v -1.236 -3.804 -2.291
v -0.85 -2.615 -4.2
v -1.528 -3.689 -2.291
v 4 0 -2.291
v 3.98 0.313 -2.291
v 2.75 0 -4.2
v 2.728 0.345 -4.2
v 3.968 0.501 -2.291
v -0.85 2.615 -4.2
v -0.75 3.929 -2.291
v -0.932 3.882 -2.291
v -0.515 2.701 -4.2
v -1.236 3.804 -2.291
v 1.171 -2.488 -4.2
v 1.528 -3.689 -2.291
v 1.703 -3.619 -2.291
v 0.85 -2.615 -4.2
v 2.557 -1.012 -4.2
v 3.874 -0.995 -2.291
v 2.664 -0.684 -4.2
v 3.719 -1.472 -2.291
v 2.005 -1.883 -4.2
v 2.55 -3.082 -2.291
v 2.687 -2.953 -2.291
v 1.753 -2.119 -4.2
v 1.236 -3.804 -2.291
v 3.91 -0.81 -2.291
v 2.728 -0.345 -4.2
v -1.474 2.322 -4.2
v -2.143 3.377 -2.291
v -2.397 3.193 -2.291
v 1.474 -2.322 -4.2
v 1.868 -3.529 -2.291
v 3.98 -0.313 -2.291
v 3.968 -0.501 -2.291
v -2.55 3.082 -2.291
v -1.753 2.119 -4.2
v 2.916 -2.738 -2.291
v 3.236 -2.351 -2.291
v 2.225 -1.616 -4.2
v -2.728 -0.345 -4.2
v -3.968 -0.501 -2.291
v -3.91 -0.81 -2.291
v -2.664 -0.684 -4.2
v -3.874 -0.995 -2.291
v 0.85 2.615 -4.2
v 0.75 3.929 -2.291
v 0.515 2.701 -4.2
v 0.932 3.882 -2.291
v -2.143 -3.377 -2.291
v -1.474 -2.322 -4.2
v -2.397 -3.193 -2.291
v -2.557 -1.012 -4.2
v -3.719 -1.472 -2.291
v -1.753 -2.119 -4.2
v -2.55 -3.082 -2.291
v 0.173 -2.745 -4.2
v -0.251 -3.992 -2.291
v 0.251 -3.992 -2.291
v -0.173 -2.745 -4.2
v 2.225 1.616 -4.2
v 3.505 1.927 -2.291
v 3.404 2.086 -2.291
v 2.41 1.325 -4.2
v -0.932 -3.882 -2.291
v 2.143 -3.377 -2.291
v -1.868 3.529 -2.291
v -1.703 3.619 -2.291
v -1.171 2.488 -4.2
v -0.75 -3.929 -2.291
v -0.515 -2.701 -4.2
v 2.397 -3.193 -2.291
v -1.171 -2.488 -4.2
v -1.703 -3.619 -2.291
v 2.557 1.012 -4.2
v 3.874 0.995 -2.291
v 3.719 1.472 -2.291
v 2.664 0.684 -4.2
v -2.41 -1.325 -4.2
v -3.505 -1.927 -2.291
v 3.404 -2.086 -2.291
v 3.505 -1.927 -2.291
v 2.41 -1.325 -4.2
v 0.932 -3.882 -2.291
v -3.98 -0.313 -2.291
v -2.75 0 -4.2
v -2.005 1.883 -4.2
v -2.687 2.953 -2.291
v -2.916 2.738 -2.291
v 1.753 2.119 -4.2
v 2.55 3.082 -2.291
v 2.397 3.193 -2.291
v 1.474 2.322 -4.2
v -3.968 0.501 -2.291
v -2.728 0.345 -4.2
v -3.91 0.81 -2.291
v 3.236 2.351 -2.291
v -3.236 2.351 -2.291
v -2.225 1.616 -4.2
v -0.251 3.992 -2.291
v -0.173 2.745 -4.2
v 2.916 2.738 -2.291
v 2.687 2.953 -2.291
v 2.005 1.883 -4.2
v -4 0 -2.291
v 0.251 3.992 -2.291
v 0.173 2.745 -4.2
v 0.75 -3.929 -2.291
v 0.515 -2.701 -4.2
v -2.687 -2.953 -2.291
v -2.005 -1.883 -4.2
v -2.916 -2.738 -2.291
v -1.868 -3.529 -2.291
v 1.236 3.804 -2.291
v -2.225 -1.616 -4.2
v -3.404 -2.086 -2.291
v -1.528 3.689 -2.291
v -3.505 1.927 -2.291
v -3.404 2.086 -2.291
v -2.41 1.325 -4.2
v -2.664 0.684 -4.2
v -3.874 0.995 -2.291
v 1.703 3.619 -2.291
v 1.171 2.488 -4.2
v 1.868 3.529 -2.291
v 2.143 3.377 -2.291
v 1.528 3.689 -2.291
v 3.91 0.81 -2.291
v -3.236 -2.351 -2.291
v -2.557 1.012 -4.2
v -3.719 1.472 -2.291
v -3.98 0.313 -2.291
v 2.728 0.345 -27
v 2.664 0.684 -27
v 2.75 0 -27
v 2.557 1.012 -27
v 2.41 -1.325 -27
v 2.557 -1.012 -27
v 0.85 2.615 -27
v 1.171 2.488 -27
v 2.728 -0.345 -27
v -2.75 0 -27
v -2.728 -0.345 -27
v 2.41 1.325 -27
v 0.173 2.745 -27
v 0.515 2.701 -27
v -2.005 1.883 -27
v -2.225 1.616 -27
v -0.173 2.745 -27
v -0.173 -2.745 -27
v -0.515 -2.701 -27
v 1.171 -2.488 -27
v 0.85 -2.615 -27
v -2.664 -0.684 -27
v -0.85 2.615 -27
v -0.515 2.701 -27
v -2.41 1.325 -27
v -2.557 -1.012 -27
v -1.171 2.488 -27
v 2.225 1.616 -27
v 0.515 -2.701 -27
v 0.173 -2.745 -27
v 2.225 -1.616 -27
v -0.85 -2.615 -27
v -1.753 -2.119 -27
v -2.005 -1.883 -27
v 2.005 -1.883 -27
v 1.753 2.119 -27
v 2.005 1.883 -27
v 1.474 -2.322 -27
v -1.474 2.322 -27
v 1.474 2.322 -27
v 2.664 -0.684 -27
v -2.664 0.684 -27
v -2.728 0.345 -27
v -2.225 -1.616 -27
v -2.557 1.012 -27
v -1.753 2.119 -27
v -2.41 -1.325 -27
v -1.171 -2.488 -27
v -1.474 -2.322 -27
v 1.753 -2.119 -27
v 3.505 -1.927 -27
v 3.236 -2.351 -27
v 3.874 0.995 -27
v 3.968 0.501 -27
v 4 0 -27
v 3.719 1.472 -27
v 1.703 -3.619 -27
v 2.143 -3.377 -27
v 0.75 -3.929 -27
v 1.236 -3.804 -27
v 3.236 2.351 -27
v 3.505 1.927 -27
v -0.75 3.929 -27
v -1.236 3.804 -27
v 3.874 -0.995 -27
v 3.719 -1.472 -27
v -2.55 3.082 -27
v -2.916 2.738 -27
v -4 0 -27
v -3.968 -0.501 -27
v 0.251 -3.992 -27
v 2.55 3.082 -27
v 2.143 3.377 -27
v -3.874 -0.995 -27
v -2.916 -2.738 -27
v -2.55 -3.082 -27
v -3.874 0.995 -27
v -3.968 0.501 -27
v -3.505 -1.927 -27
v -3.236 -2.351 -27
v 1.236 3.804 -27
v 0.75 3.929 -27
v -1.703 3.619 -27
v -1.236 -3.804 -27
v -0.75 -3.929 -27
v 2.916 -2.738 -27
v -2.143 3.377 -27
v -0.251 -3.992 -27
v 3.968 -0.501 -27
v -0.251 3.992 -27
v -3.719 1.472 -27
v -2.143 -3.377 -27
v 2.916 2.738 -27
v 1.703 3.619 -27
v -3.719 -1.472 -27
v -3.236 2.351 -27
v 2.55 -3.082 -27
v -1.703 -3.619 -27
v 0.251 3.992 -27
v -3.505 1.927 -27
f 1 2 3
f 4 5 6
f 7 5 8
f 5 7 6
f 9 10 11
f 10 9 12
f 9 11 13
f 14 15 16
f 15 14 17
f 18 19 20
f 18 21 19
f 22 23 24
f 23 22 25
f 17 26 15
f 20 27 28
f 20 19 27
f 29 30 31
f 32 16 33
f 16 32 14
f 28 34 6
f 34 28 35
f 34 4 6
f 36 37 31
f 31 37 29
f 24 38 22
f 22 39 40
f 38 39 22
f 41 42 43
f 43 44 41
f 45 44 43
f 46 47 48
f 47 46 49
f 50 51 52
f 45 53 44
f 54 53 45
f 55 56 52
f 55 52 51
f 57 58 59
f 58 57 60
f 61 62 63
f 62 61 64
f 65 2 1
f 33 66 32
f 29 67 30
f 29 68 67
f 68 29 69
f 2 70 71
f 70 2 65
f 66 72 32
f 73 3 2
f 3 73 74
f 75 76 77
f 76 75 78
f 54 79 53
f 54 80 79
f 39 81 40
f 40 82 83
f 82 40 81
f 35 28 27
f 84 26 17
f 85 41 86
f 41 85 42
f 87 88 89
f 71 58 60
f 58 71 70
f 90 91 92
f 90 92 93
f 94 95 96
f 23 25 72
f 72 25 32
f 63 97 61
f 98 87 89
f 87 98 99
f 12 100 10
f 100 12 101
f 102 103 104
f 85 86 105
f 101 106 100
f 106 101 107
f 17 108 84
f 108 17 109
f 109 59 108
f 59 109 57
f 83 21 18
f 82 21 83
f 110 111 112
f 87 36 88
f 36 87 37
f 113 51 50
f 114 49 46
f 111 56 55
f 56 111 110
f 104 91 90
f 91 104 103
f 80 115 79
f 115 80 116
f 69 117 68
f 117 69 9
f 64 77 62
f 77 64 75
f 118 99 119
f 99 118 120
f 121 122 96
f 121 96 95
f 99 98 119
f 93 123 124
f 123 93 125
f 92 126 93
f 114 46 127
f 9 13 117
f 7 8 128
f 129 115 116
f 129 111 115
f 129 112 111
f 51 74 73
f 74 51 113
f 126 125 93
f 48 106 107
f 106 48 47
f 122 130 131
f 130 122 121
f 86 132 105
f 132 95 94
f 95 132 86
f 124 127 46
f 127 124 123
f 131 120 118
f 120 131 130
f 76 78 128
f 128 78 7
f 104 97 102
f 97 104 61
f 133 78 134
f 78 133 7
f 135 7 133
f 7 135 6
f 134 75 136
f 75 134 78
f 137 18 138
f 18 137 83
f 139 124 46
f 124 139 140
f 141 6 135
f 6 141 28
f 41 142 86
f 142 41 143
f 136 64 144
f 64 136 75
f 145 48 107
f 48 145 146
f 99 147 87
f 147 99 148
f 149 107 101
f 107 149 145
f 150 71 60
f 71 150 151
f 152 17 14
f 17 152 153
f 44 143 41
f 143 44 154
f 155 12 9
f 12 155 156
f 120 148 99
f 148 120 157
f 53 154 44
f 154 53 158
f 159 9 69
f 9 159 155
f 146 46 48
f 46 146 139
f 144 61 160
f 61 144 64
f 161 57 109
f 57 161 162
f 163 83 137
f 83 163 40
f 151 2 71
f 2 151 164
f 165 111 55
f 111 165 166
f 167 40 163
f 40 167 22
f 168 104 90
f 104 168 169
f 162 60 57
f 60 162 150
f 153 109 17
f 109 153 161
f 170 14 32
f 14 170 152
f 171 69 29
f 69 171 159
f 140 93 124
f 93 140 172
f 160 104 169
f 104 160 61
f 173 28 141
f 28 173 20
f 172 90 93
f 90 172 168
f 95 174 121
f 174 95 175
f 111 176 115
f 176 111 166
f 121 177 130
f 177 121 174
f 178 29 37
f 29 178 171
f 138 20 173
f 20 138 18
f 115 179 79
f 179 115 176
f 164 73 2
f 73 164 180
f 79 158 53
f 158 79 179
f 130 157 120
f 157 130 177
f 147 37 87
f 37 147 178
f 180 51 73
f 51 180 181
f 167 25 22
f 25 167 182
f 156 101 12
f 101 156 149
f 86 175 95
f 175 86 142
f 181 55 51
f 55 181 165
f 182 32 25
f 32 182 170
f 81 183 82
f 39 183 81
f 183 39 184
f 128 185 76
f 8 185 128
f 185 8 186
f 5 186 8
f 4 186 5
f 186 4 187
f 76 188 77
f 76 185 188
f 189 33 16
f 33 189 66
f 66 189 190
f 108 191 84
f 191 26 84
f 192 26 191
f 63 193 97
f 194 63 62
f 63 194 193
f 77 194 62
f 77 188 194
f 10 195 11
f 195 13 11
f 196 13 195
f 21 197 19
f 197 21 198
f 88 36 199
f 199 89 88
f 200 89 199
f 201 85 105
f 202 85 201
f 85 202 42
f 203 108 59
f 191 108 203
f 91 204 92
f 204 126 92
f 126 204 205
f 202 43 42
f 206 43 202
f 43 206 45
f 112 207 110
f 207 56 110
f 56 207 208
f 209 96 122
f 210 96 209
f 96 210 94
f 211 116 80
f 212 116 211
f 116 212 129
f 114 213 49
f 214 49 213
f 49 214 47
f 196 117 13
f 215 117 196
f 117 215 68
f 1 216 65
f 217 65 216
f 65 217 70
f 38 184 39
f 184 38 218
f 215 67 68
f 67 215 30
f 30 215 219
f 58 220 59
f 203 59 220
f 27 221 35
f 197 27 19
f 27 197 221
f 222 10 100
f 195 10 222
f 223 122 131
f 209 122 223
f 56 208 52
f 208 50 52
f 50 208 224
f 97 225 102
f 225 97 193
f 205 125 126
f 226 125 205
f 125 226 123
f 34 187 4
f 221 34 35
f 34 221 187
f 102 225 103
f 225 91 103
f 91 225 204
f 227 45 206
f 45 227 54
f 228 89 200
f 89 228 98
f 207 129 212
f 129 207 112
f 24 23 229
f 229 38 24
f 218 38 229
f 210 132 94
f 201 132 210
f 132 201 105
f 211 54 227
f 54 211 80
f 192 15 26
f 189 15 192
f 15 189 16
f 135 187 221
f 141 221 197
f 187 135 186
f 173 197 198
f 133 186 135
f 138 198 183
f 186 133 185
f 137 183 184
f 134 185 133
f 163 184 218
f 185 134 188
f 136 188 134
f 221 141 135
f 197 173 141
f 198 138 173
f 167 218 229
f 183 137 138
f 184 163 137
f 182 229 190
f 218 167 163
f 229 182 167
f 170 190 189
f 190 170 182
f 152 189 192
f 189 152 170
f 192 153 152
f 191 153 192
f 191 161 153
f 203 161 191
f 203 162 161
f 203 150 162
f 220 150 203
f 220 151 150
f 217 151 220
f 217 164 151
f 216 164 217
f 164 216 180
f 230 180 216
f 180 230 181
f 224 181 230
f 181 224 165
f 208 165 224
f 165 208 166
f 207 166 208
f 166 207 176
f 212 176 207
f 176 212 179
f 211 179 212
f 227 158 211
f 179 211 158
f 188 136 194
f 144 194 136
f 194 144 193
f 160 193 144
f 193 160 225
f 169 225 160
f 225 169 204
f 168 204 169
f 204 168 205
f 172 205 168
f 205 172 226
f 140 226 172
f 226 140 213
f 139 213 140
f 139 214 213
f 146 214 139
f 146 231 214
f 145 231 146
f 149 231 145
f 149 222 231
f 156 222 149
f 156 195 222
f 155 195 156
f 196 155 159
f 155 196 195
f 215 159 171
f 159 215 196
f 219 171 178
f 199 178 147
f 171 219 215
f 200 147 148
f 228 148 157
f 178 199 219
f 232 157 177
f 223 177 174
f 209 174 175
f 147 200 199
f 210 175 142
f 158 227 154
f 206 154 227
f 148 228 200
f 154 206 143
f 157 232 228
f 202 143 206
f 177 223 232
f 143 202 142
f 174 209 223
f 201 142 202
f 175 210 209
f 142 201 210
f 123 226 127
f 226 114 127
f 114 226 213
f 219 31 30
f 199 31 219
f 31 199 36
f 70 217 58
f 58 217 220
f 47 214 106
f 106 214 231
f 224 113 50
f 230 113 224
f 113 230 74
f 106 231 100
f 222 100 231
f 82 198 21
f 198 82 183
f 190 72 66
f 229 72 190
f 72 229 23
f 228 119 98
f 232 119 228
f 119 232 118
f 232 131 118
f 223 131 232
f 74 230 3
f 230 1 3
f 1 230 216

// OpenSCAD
$fn = 50;

difference() {
	union() {
		translate(v = [0, 0, -27.0]) {
			cylinder(h = 30, r = 4.0);
		}
	}
	union() {
		translate(v = [0, 0, 0]) {
			rotate(a = [0, 0, 0]) {
				difference() {
					union() {
						translate(v = [0, 0, -30.0]) {
							cylinder(h = 30, r = 2.25);
						}
						translate(v = [0, 0, -4.2]) {
							cylinder(h = 4.2, r1 = 2.75, r2 = 5.5);
						}
						translate(v = [0, 0, -30.0]) {
							cylinder(h = 30, r = 2.75);
						}
						translate(v = [0, 0, -30.0]) {
							cylinder(h = 30, r = 2.25);
						}
					}
					union();
				}
			}
		}
		#cylinder(h = 3, r = 6.25);
	}
}
